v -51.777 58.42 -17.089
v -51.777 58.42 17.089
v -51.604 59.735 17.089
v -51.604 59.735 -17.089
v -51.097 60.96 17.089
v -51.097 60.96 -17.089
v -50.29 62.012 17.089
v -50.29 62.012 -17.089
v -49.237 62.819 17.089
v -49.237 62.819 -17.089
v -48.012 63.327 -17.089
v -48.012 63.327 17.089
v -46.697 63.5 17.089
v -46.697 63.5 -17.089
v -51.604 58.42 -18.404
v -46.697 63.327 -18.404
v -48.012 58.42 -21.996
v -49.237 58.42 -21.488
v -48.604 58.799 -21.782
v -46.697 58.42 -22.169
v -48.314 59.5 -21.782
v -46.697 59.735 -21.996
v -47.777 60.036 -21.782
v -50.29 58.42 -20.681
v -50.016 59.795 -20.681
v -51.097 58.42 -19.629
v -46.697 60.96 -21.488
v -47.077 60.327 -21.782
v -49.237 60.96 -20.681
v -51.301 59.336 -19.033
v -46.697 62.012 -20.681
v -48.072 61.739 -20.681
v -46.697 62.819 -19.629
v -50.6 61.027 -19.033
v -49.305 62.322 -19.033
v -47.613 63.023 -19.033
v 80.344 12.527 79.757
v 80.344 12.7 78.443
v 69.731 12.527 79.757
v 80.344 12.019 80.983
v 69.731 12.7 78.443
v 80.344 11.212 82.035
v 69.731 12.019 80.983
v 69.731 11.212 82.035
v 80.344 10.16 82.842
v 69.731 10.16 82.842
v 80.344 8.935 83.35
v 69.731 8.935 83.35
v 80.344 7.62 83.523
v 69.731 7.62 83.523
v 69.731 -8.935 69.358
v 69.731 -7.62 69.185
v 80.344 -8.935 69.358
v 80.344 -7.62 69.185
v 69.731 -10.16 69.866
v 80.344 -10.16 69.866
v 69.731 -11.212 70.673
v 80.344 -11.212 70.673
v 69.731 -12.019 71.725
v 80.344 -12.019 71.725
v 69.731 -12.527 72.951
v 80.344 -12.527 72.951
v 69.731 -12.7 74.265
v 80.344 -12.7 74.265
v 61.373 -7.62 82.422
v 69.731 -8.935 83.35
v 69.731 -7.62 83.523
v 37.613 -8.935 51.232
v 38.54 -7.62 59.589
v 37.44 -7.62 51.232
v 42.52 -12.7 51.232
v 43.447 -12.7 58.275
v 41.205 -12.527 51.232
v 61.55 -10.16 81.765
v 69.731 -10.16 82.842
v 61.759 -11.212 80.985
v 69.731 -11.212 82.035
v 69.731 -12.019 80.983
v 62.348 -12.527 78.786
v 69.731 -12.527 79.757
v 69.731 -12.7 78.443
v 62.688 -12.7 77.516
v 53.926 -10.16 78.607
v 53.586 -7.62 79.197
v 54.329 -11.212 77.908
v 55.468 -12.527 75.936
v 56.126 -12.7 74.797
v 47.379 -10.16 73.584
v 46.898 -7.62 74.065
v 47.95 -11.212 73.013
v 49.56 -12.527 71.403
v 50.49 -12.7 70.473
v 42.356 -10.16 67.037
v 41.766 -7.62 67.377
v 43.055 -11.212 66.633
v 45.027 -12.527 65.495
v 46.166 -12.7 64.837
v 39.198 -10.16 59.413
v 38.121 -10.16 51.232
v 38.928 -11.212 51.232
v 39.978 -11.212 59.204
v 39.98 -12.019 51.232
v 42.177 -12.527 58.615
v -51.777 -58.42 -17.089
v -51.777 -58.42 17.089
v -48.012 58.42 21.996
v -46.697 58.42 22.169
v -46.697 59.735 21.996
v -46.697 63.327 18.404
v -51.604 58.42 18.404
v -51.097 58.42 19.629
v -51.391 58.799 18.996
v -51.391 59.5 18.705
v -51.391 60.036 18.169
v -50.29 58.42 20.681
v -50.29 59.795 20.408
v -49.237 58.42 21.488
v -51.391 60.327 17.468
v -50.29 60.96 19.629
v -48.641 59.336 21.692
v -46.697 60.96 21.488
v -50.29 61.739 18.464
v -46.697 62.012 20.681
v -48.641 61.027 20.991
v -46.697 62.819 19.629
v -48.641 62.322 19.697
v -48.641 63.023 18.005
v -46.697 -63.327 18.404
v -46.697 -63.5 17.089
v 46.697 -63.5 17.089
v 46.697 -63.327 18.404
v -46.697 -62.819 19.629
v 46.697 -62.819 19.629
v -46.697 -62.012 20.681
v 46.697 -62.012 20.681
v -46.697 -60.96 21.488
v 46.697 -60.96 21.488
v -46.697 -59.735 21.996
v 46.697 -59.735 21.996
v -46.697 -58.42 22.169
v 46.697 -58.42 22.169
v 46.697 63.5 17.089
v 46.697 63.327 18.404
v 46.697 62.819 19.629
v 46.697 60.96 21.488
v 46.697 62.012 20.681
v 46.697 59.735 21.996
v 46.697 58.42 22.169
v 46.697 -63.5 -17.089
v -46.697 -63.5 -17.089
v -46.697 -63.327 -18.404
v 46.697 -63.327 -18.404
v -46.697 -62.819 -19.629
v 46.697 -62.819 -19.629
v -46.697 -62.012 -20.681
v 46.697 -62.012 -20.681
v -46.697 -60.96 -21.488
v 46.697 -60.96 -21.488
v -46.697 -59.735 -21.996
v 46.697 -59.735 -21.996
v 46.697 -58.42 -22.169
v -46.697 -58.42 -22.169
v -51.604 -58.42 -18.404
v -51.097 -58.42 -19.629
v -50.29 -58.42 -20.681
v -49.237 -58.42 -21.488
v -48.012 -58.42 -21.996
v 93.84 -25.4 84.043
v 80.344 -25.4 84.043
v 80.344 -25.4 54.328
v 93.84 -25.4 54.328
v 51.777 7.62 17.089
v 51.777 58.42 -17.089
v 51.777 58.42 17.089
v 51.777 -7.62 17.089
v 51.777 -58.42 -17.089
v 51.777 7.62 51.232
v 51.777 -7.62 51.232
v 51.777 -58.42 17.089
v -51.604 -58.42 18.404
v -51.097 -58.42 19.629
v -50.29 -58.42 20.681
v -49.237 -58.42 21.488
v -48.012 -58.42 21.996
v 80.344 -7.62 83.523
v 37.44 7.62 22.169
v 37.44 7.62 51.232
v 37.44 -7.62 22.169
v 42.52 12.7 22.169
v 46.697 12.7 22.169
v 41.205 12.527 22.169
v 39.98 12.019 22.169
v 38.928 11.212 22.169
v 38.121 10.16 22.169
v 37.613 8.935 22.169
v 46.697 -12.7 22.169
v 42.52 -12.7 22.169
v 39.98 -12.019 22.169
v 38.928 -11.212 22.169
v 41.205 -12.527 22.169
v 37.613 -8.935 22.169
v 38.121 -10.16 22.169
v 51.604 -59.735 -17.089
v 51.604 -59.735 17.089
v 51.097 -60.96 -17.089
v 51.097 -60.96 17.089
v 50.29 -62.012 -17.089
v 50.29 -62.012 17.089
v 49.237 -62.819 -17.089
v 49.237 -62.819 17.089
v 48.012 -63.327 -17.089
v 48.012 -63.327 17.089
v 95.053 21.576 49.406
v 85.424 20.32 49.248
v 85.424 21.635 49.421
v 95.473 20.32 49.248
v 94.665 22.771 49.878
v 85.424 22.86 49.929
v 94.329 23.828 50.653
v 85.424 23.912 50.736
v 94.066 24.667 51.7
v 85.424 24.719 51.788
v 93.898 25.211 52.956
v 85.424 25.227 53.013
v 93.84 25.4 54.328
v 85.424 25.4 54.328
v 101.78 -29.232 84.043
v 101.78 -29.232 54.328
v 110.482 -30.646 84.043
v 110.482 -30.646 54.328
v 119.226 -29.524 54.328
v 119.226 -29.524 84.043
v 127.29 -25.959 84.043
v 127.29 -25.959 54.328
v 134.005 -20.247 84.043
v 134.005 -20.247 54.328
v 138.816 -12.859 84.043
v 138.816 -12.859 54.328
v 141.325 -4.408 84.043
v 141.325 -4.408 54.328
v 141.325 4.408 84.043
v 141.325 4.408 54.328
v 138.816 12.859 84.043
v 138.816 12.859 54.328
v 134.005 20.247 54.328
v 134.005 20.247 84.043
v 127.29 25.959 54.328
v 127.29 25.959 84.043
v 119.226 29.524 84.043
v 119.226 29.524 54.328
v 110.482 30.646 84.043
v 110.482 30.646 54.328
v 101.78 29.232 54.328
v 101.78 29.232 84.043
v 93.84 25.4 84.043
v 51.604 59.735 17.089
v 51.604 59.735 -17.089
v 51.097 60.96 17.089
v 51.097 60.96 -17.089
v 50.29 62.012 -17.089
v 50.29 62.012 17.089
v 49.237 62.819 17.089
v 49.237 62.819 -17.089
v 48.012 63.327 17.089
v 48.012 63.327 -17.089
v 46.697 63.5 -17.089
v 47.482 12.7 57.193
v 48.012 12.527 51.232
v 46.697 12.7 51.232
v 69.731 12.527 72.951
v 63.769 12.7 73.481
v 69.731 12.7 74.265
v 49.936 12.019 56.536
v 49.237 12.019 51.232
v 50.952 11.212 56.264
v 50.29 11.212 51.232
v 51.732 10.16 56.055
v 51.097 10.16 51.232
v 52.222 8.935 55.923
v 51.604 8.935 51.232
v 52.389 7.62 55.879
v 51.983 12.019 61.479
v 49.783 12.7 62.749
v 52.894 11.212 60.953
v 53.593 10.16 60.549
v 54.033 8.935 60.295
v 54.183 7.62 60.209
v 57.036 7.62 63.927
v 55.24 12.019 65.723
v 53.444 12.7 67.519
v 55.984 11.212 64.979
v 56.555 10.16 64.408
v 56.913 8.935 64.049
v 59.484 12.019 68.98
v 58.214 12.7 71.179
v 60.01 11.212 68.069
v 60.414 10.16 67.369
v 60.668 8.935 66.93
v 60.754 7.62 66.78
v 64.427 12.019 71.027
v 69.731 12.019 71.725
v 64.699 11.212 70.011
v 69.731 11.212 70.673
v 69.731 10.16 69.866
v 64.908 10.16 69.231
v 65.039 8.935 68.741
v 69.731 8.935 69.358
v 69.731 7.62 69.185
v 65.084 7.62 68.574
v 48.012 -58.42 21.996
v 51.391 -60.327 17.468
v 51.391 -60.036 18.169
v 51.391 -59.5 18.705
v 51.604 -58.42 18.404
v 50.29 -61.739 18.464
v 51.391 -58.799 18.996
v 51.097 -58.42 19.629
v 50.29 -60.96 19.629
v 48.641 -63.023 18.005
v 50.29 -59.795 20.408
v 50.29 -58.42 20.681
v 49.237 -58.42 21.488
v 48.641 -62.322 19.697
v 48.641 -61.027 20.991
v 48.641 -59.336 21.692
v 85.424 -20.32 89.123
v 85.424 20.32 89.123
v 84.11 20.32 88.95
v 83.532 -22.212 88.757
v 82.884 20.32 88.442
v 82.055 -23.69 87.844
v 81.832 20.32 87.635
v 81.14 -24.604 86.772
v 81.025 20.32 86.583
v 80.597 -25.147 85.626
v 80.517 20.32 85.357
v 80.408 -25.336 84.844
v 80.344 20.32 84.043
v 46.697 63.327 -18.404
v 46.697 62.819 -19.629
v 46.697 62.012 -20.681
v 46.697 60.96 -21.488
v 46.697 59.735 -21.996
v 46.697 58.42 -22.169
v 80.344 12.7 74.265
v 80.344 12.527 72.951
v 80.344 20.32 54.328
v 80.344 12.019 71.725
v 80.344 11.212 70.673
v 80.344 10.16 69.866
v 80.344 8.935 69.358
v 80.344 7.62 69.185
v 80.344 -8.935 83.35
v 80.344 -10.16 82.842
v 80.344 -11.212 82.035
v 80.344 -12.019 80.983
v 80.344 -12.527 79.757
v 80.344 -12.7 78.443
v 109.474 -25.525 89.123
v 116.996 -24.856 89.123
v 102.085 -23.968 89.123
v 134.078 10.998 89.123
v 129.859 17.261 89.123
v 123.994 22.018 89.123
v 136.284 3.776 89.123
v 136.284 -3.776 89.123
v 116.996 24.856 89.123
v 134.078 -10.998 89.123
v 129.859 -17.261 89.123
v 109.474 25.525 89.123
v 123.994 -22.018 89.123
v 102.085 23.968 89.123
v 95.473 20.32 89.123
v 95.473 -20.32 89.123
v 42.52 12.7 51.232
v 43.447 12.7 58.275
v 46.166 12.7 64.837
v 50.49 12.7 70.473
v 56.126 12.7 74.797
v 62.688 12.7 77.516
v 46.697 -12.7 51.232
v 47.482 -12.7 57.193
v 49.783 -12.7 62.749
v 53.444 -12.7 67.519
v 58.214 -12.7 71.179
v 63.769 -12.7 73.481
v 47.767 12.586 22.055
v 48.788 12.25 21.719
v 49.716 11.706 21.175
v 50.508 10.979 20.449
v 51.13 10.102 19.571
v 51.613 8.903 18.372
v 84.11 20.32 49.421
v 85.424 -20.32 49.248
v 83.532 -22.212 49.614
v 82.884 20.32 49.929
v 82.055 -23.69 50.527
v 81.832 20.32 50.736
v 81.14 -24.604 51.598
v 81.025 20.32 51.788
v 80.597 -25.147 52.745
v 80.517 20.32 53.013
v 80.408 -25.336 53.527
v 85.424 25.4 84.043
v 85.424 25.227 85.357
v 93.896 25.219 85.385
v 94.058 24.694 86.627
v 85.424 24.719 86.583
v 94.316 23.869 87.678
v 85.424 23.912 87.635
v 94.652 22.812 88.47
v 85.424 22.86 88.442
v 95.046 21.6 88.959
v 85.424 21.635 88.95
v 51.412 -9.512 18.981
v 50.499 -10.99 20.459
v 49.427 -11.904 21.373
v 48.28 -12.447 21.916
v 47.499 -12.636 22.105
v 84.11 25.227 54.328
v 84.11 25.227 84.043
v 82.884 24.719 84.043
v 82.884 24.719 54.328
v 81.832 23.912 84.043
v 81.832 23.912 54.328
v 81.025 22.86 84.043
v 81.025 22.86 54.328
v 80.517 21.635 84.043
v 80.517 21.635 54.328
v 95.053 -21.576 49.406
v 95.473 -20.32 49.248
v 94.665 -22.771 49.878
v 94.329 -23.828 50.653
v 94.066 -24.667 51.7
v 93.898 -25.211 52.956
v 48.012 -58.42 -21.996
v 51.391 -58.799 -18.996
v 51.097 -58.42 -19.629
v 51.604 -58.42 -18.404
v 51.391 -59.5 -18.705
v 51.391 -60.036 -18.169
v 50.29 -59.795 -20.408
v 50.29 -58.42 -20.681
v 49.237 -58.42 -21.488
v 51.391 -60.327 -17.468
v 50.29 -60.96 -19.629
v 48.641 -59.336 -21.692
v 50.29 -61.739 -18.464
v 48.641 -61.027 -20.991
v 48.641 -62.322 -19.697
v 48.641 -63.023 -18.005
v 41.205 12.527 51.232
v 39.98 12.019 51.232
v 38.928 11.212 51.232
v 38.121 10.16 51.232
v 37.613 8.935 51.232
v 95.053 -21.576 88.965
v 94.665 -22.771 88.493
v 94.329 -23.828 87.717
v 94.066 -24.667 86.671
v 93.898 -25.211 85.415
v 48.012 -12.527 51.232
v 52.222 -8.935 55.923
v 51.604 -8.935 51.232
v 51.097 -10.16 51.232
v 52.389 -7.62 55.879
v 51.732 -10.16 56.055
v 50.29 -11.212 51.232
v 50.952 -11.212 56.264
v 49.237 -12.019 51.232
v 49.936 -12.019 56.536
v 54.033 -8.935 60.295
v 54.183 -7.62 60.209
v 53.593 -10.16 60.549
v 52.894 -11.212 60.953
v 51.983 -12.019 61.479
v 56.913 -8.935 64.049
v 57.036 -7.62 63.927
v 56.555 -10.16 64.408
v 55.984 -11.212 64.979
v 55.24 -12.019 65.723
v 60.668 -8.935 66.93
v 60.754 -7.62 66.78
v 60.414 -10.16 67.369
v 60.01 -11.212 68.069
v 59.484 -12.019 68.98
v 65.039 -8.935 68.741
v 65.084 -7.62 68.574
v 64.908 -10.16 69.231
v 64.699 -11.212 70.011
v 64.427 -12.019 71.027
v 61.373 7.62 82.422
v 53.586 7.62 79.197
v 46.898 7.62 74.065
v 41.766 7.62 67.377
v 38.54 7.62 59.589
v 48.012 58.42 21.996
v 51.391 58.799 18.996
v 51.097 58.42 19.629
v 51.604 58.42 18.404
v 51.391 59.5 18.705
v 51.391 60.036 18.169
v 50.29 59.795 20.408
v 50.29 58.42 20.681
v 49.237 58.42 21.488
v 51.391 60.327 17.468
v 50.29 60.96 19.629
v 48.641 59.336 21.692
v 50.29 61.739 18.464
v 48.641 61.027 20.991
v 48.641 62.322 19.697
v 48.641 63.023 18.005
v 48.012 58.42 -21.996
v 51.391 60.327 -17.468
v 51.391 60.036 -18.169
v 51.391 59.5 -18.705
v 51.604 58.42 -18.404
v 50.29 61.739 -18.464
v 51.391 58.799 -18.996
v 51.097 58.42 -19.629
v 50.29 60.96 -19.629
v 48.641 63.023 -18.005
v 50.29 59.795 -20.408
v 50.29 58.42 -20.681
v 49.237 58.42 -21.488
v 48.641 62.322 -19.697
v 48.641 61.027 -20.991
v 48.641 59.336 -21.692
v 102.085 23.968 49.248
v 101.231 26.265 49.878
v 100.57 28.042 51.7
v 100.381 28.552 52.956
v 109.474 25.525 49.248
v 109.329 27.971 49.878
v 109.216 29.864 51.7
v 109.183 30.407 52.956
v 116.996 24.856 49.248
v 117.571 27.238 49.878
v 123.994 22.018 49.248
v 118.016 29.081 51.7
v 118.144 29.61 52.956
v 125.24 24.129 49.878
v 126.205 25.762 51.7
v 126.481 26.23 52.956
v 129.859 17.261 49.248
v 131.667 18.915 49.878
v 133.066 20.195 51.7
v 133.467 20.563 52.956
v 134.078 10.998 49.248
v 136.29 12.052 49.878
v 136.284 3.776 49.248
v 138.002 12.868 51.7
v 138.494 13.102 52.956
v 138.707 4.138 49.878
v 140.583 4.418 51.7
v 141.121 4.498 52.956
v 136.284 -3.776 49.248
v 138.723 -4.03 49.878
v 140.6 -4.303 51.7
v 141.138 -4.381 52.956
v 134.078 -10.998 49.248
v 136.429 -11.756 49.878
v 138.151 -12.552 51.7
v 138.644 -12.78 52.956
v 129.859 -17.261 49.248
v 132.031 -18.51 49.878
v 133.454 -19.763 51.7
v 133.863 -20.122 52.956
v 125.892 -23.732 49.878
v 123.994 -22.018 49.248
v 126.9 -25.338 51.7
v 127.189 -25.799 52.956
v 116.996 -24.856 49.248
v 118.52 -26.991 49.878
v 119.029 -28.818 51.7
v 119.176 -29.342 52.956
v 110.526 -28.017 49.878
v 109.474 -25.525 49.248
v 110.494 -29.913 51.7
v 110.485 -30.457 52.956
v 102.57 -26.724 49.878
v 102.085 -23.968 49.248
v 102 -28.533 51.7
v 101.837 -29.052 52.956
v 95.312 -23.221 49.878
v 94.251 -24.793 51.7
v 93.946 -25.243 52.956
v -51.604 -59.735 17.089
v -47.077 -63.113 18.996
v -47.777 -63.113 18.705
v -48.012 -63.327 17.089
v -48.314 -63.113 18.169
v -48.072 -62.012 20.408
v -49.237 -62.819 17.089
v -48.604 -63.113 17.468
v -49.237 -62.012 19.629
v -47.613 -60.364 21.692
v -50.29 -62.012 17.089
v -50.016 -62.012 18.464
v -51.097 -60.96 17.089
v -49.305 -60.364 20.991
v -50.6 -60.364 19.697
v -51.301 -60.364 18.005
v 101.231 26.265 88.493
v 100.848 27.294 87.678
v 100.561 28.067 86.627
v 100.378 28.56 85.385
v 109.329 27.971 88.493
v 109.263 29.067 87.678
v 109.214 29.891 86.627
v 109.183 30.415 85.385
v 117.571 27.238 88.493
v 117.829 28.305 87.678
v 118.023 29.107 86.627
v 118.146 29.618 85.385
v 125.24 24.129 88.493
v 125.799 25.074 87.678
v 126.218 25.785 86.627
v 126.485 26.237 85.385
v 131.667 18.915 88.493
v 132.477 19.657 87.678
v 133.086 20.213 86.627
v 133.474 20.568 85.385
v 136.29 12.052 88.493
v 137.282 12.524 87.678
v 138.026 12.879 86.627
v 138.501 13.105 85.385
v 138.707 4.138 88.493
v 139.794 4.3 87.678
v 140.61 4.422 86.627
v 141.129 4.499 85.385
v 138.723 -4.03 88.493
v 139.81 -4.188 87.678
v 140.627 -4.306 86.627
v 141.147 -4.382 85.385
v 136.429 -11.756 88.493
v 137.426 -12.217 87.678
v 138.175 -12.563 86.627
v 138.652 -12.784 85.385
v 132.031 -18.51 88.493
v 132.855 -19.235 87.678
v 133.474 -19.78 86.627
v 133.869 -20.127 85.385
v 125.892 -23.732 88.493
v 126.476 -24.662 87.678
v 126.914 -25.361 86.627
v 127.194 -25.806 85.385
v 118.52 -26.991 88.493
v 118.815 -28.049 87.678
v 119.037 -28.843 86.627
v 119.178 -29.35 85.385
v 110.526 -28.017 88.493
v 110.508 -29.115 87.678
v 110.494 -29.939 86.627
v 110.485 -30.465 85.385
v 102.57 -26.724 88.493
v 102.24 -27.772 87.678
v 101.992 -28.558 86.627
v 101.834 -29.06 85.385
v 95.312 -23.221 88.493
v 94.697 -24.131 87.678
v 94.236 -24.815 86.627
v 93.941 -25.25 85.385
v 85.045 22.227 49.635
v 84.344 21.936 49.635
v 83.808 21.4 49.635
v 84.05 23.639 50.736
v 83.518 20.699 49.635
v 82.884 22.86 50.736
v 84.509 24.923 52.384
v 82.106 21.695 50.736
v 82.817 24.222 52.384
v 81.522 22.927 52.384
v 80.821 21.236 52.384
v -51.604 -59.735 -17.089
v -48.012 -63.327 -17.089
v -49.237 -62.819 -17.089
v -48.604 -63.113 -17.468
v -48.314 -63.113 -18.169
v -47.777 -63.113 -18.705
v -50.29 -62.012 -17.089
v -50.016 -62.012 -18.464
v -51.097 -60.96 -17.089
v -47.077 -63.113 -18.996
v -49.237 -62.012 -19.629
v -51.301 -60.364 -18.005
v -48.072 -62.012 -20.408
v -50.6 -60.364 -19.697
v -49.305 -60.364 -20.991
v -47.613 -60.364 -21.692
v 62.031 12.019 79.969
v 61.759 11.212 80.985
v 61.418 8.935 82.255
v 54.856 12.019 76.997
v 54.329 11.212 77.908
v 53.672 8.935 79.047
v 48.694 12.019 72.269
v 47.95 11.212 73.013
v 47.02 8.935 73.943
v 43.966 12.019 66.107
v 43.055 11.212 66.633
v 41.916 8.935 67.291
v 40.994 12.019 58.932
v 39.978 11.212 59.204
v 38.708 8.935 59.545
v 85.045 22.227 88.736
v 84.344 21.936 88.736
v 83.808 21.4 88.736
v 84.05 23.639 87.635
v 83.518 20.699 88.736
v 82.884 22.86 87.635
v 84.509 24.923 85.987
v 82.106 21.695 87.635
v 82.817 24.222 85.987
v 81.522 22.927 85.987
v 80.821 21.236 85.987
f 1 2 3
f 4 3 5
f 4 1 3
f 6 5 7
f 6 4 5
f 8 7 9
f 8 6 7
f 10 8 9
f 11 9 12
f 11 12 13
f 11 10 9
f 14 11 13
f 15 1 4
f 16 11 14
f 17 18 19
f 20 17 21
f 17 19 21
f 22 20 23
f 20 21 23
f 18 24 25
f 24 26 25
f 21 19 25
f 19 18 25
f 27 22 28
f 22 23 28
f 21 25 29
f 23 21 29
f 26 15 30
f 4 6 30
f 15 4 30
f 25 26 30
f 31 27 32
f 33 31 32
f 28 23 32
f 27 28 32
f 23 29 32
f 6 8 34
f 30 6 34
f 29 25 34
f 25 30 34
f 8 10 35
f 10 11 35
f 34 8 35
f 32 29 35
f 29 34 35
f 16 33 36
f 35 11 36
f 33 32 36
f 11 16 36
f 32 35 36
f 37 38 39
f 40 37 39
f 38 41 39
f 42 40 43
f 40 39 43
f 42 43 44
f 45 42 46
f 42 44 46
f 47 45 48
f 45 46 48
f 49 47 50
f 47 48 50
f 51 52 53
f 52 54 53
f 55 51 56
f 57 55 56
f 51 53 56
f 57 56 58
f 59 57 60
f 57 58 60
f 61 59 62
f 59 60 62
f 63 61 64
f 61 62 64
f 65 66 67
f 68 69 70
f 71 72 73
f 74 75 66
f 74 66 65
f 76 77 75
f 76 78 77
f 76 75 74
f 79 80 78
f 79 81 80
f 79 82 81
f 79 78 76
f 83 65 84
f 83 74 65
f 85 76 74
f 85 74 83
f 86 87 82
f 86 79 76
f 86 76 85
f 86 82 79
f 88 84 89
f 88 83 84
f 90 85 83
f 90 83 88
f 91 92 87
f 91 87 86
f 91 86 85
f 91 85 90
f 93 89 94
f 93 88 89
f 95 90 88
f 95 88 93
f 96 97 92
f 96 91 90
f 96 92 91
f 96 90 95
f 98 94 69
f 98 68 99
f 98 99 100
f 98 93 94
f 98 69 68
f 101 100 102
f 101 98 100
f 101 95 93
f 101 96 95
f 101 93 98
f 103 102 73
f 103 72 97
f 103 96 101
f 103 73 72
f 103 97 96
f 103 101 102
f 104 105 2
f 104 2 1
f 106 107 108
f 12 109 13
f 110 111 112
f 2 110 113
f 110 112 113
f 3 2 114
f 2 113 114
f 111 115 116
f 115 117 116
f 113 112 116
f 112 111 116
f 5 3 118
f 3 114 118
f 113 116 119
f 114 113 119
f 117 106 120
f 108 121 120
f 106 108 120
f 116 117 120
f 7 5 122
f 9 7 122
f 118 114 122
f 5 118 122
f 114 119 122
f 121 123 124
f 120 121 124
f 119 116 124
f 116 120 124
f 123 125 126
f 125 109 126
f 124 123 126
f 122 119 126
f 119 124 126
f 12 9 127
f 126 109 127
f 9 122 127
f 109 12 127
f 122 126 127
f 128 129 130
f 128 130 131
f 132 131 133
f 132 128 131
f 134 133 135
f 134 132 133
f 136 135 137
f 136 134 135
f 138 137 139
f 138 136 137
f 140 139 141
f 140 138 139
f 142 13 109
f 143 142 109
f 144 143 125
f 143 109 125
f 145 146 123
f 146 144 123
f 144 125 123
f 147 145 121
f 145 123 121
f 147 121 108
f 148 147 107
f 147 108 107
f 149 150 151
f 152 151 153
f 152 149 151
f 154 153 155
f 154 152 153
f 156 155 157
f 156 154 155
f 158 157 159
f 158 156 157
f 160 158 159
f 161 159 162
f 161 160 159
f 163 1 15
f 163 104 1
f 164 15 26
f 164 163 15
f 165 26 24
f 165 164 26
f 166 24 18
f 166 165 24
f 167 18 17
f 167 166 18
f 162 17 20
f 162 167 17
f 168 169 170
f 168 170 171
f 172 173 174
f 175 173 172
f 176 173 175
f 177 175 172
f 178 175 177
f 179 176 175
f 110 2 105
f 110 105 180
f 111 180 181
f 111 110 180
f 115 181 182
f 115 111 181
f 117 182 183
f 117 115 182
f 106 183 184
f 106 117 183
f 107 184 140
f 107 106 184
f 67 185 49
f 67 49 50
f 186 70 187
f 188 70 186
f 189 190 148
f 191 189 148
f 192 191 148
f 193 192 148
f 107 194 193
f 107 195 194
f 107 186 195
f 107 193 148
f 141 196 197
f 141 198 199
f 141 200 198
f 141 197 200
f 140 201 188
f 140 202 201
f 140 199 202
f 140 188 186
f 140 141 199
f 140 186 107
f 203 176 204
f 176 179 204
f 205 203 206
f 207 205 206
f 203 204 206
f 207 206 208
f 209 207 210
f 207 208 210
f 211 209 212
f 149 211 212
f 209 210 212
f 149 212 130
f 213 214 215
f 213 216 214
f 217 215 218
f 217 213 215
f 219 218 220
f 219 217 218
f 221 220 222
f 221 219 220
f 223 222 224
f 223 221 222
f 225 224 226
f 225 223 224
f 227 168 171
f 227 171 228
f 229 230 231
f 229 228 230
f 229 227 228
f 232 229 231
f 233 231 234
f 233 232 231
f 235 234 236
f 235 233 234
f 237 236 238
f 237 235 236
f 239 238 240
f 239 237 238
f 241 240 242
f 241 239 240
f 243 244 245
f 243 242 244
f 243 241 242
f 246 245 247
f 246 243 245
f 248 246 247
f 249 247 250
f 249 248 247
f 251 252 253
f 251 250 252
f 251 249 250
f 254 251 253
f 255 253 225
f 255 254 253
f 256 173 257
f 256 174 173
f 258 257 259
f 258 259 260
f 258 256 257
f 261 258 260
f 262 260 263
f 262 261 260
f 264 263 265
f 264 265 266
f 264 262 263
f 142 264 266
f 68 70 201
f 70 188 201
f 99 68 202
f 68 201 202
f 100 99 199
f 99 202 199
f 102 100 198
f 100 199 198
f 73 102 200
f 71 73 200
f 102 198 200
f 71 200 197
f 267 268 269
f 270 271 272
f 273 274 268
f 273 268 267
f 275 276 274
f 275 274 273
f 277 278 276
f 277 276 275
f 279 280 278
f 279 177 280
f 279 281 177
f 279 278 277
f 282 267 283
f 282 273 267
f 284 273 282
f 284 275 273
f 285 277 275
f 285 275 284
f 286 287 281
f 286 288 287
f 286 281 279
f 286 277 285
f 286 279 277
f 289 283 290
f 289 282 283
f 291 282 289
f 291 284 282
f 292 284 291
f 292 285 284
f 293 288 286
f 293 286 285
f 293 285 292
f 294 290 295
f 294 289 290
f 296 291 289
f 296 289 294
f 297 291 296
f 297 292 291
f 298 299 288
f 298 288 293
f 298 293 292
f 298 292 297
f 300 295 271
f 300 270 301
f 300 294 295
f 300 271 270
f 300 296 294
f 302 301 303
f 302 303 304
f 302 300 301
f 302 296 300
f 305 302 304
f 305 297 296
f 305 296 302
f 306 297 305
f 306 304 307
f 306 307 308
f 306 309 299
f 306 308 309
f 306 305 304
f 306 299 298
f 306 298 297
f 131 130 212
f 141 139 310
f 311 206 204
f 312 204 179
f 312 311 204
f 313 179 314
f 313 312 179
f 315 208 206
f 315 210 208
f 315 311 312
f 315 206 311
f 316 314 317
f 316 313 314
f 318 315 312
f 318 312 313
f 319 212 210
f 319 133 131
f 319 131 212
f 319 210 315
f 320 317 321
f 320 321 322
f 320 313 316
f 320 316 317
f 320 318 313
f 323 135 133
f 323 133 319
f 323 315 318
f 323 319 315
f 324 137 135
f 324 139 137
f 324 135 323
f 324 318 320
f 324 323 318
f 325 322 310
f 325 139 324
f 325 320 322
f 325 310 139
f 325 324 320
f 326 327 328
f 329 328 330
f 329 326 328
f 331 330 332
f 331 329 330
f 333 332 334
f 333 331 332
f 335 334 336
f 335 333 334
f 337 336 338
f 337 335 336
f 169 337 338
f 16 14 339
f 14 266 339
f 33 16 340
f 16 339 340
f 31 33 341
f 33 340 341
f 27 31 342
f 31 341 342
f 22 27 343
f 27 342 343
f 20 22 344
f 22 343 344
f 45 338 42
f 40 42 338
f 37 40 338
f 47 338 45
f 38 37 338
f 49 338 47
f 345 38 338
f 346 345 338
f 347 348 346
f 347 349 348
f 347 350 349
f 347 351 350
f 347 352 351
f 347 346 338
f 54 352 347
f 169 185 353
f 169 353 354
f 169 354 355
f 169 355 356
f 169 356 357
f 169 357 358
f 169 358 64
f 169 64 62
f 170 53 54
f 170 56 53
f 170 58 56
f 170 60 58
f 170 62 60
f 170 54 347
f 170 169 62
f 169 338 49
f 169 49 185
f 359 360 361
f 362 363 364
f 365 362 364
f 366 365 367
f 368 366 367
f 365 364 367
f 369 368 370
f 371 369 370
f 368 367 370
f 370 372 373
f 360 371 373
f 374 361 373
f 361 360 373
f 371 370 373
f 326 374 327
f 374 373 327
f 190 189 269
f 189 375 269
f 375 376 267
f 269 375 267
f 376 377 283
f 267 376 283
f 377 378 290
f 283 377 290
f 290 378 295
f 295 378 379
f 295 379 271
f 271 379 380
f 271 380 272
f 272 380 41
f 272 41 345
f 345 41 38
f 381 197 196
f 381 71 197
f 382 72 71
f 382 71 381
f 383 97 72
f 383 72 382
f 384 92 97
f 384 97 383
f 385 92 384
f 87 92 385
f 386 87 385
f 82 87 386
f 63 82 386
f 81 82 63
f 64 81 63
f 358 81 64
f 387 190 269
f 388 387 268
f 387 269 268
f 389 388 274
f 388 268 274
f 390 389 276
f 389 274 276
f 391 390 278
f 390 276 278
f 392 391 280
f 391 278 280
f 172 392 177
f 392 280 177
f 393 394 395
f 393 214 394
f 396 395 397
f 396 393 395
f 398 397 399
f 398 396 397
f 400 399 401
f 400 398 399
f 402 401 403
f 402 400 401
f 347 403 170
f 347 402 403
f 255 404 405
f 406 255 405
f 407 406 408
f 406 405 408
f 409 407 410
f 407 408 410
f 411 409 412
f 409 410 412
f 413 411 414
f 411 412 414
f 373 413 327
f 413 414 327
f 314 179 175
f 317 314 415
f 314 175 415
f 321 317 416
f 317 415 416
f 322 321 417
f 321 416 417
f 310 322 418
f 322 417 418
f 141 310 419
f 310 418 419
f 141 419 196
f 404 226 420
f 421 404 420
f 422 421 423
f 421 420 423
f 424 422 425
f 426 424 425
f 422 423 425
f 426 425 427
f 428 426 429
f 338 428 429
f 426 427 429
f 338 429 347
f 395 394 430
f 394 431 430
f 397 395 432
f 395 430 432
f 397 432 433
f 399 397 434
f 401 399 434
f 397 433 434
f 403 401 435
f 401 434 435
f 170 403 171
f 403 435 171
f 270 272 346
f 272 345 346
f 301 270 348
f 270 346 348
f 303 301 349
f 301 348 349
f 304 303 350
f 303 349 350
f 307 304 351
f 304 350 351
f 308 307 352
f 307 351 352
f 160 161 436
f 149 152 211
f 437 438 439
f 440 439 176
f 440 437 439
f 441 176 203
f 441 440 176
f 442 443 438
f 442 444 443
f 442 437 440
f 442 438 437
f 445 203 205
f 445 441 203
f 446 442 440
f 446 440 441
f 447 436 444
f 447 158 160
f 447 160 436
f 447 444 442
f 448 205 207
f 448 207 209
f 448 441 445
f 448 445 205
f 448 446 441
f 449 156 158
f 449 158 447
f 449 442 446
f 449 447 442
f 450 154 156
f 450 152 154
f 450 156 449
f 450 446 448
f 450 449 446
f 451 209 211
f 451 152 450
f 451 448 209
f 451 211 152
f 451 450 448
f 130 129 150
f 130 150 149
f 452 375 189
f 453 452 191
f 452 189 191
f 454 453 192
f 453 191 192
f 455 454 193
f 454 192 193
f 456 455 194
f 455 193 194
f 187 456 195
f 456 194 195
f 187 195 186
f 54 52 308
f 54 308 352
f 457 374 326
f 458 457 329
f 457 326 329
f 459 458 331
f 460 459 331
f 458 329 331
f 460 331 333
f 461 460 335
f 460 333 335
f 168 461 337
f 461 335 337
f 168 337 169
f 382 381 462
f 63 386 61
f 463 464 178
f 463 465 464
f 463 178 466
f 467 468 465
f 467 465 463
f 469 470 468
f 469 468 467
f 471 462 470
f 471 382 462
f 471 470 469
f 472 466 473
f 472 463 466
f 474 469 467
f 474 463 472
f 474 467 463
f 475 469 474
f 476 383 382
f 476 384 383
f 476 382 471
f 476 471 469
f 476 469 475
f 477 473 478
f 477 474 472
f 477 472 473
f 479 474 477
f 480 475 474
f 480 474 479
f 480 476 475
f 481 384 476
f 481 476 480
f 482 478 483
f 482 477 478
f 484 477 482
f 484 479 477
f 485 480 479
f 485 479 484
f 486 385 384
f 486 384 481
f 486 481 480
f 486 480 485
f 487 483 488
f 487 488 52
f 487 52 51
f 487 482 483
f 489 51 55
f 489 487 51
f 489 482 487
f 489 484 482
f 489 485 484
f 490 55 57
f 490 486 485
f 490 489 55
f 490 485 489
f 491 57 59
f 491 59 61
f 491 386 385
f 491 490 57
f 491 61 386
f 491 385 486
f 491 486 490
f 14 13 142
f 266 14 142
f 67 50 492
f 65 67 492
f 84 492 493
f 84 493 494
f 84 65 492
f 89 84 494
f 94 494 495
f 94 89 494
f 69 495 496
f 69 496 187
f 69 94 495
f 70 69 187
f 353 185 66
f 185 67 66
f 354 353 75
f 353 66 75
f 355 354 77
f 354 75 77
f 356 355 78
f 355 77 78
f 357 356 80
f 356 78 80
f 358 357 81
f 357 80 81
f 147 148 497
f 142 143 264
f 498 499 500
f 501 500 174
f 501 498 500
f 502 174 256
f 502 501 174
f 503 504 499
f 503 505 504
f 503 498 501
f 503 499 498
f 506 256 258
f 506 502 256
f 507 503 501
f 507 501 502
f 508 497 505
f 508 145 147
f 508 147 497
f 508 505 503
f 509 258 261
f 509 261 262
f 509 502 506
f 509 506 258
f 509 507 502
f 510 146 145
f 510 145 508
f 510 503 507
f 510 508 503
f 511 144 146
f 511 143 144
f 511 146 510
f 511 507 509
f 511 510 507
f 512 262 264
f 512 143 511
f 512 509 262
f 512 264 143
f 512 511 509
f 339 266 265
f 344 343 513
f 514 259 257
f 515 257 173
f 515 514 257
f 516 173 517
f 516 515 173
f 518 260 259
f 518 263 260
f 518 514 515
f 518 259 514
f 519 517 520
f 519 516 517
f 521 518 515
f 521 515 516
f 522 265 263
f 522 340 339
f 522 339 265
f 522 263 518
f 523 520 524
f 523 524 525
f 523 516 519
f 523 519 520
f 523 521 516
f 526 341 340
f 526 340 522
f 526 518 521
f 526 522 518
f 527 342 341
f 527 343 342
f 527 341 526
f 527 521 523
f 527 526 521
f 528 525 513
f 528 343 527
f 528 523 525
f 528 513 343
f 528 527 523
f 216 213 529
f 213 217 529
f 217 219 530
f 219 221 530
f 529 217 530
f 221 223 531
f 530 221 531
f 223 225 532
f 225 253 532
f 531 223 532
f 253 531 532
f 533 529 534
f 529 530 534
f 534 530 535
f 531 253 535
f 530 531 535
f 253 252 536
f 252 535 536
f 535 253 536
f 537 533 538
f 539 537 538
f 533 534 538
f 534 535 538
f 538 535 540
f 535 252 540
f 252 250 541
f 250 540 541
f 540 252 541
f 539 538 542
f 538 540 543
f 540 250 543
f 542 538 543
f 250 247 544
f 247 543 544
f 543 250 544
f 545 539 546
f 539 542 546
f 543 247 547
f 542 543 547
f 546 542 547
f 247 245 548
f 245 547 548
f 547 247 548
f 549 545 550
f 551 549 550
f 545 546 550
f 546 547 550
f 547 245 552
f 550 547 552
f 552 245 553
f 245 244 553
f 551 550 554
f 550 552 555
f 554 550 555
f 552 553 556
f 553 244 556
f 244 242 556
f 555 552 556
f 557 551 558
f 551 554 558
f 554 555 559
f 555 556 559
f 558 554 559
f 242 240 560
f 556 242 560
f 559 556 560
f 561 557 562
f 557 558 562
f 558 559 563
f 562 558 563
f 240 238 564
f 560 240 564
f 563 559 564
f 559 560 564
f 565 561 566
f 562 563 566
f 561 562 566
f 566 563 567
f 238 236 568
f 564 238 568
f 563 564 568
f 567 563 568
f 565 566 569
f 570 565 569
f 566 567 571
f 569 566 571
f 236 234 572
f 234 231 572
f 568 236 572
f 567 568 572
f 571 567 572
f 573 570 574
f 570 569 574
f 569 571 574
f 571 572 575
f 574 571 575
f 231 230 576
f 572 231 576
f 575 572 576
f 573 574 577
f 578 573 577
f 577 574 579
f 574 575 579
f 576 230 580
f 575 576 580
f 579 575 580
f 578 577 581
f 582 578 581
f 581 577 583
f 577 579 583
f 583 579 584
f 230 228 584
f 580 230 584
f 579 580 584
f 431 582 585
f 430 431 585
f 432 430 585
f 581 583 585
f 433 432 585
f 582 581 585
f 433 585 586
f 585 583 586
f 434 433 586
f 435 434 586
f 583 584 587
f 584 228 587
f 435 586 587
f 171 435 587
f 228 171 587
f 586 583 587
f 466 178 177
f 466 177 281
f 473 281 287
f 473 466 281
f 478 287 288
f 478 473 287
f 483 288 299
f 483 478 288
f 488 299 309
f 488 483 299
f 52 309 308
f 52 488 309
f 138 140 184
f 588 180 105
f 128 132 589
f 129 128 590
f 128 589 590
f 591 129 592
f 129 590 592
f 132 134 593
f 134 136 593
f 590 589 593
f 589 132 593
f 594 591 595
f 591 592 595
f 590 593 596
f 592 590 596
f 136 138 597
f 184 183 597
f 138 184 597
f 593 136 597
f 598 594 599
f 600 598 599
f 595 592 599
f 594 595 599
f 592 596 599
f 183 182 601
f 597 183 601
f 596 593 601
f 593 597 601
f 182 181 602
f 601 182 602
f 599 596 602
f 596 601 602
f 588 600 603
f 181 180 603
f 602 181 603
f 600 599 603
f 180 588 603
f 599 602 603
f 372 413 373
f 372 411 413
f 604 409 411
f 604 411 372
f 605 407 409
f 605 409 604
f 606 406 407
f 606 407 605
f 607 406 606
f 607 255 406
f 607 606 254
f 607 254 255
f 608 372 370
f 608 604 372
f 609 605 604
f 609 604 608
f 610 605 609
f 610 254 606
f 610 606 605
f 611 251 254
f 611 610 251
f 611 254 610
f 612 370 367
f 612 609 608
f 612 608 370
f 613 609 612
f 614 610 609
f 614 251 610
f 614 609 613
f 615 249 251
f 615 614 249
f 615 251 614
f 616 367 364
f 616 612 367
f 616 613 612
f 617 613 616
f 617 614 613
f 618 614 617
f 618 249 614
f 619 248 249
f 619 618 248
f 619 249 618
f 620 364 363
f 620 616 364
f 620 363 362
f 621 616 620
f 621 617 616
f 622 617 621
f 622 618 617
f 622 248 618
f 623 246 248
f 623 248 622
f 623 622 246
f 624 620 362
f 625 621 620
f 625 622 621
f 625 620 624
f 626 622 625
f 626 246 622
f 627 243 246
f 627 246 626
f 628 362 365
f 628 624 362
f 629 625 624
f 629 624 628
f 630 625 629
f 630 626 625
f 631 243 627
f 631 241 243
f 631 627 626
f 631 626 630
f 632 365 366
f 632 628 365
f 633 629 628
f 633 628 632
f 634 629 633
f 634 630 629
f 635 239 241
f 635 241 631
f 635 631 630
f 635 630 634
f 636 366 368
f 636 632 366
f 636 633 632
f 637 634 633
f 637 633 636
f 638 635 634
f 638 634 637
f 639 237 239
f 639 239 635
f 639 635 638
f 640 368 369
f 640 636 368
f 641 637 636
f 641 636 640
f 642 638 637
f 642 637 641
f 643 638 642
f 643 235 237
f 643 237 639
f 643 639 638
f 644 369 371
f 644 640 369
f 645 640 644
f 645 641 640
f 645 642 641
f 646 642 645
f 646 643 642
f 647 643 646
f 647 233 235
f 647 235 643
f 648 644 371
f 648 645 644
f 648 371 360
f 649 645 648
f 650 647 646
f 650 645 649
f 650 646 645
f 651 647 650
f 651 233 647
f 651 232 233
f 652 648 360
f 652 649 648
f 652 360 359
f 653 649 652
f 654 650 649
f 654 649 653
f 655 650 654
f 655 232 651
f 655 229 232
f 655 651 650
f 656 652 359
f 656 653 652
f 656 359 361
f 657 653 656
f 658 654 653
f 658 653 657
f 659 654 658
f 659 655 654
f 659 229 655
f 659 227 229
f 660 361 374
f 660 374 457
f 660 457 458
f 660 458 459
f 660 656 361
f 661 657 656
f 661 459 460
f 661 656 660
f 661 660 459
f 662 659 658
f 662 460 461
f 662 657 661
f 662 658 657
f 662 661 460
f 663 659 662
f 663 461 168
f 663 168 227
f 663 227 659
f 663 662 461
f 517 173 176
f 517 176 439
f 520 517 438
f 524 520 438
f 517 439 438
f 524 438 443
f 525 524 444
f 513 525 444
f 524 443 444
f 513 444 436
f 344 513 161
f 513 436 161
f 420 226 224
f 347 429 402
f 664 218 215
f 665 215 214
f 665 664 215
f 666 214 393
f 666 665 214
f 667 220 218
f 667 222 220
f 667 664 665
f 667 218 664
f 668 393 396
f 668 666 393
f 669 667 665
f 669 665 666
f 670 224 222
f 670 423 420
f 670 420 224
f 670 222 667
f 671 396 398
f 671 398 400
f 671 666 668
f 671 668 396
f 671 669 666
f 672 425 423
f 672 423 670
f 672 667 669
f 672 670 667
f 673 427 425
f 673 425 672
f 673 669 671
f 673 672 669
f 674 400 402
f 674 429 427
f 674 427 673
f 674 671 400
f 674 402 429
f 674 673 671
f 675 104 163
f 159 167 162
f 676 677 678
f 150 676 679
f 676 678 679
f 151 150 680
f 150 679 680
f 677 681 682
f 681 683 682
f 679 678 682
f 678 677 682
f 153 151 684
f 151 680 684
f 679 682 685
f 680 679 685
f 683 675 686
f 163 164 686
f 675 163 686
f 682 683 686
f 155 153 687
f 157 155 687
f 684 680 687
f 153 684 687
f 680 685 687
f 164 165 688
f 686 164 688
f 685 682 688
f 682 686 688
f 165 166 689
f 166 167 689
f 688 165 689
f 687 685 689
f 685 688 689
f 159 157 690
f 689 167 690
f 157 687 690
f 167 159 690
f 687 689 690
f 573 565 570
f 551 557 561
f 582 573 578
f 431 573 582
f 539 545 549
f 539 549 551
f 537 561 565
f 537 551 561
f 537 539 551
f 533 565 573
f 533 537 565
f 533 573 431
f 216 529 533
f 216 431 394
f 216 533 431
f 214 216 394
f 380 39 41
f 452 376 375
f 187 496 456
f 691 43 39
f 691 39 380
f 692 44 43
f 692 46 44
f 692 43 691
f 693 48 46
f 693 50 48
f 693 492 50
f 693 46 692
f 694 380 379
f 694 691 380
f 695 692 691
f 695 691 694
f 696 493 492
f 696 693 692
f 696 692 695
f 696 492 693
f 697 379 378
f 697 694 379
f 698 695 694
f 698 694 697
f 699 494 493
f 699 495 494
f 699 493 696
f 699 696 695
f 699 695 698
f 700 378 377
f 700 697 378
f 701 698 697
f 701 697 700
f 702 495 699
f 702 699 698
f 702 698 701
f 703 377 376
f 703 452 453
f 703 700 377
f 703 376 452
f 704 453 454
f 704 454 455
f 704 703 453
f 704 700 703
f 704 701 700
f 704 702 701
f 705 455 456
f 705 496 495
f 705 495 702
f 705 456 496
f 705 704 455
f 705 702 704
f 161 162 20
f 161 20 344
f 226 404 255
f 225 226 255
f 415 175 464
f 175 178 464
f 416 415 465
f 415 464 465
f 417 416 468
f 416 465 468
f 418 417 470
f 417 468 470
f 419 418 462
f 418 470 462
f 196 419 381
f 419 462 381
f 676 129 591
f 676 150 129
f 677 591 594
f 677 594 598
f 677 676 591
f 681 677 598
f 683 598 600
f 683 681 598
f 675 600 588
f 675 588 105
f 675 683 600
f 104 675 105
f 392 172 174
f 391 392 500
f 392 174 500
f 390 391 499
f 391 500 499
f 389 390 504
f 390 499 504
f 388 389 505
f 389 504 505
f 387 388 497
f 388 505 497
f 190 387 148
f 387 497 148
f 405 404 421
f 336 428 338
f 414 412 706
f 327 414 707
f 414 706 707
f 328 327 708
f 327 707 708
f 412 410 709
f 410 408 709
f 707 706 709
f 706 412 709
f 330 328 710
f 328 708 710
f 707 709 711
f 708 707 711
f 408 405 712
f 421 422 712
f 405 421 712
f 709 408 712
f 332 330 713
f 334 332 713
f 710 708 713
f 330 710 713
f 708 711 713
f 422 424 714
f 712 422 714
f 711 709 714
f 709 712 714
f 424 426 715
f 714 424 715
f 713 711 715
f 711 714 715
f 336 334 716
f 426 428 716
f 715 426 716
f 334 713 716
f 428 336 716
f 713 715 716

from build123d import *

# Parameters (mm, degrees)
F1_DEPTH = 63.5
F2_DEPTH = 12.7
F3_DEPTH = 25.4
F0_W     = 30.6498706341
F0_H     = 39.8745834827
F5_R     = 5.08


with BuildPart() as f1:
    # F0 (on Front) → F1 (new body, symmetric)
    with BuildSketch(Plane.XZ):
        Polygon((37.4401323497, 22.1690796316), (-51.7774410546, 22.1690796316), (-51.7774410546, -22.1690796316), (51.7774410546, -22.1690796316), (51.7774410546, 22.1690796316), align=None)
    extrude(amount=F1_DEPTH, both=True)

    # F0 (on Front) → F2 (join, symmetric)
    with BuildSketch(Plane.XZ):
        with BuildLine():
            Line((37.4401323497, 51.2318972406), (37.4401323497, 22.1690796316))
            Line((37.4401323497, 22.1690796316), (51.7774410546, 22.1690796316))
            Line((51.7774410546, 22.1690796316), (51.7774410546, 51.2318972406))
            ThreePointArc((51.7774410546, 51.2318972406), (57.0358954685, 63.9269292039), (69.7309274318, 69.1853836179))
            Line((69.7309274318, 69.1853836179), (80.344311893, 69.1853836179))
            Line((80.344311893, 69.1853836179), (80.344311893, 83.5226923227))
            Line((80.344311893, 83.5226923227), (69.7309274318, 83.5226923227))
            ThreePointArc((69.7309274318, 83.5226923227), (46.8978872594, 74.0649374131), (37.4401323497, 51.2318972406))
        make_face()
    extrude(amount=F2_DEPTH, both=True)

    # F0 (on Front) → F3 (join, symmetric)
    with BuildSketch(Plane.XZ):
        Polygon((80.344311893, 89.1226753592), (80.344311893, 83.5226923227), (80.344311893, 69.1853836179), (80.344311893, 49.2480918765), (110.9941825271, 49.2480918765), (110.9941825271, 89.1226753592), align=None)
    extrude(amount=F3_DEPTH, both=True)

    # F0 (on Front) → F4 (revolve)
    with BuildSketch(Plane.XZ):
        with Locations((126.3191178441, 69.1853836179)):
            Rectangle(F0_W, F0_H)
    revolve(axis=Axis((110.9941825271, 0, 69.1853836179), (0, 0, 1)))

    # F5
    f5_edges = [f1.edges().sort_by_distance(p)[0] for p in [
        (51.777441, 12.7, 36.700488),
        (46.897887, 12.7, 74.064937),
        (46.897887, -12.7, 74.064937),
        (80.344312, 25.4, 69.185384),
        (141.644053, 0, 89.122675),
        (87.092322, 25.4, 89.122675),
        (80.344312, 0, 89.122675),
        (87.092322, -25.4, 89.122675),
        (87.092322, 25.4, 49.248092),
        (141.644053, 0, 49.248092),
        (87.092322, -25.4, 49.248092),
        (80.344312, 0, 49.248092),
        (51.777441, -12.7, 36.700488),
        (57.035895, 12.7, 63.926929),
        (0, 63.5, 22.16908),
        (-51.777441, 0, 22.16908),
        (-51.777441, 63.5, 0),
        (-51.777441, 0, -22.16908),
        (0, 63.5, -22.16908),
        (51.777441, 38.1, 22.16908),
        (0, -63.5, 22.16908),
        (-51.777441, -63.5, 0),
        (51.777441, 63.5, 0),
        (0, -63.5, -22.16908),
        (51.777441, 0, -22.16908),
        (51.777441, -63.5, 0),
        (51.777441, -38.1, 22.16908),
    ]]
    fillet(f5_edges, radius=F5_R)


solid = f1.part
